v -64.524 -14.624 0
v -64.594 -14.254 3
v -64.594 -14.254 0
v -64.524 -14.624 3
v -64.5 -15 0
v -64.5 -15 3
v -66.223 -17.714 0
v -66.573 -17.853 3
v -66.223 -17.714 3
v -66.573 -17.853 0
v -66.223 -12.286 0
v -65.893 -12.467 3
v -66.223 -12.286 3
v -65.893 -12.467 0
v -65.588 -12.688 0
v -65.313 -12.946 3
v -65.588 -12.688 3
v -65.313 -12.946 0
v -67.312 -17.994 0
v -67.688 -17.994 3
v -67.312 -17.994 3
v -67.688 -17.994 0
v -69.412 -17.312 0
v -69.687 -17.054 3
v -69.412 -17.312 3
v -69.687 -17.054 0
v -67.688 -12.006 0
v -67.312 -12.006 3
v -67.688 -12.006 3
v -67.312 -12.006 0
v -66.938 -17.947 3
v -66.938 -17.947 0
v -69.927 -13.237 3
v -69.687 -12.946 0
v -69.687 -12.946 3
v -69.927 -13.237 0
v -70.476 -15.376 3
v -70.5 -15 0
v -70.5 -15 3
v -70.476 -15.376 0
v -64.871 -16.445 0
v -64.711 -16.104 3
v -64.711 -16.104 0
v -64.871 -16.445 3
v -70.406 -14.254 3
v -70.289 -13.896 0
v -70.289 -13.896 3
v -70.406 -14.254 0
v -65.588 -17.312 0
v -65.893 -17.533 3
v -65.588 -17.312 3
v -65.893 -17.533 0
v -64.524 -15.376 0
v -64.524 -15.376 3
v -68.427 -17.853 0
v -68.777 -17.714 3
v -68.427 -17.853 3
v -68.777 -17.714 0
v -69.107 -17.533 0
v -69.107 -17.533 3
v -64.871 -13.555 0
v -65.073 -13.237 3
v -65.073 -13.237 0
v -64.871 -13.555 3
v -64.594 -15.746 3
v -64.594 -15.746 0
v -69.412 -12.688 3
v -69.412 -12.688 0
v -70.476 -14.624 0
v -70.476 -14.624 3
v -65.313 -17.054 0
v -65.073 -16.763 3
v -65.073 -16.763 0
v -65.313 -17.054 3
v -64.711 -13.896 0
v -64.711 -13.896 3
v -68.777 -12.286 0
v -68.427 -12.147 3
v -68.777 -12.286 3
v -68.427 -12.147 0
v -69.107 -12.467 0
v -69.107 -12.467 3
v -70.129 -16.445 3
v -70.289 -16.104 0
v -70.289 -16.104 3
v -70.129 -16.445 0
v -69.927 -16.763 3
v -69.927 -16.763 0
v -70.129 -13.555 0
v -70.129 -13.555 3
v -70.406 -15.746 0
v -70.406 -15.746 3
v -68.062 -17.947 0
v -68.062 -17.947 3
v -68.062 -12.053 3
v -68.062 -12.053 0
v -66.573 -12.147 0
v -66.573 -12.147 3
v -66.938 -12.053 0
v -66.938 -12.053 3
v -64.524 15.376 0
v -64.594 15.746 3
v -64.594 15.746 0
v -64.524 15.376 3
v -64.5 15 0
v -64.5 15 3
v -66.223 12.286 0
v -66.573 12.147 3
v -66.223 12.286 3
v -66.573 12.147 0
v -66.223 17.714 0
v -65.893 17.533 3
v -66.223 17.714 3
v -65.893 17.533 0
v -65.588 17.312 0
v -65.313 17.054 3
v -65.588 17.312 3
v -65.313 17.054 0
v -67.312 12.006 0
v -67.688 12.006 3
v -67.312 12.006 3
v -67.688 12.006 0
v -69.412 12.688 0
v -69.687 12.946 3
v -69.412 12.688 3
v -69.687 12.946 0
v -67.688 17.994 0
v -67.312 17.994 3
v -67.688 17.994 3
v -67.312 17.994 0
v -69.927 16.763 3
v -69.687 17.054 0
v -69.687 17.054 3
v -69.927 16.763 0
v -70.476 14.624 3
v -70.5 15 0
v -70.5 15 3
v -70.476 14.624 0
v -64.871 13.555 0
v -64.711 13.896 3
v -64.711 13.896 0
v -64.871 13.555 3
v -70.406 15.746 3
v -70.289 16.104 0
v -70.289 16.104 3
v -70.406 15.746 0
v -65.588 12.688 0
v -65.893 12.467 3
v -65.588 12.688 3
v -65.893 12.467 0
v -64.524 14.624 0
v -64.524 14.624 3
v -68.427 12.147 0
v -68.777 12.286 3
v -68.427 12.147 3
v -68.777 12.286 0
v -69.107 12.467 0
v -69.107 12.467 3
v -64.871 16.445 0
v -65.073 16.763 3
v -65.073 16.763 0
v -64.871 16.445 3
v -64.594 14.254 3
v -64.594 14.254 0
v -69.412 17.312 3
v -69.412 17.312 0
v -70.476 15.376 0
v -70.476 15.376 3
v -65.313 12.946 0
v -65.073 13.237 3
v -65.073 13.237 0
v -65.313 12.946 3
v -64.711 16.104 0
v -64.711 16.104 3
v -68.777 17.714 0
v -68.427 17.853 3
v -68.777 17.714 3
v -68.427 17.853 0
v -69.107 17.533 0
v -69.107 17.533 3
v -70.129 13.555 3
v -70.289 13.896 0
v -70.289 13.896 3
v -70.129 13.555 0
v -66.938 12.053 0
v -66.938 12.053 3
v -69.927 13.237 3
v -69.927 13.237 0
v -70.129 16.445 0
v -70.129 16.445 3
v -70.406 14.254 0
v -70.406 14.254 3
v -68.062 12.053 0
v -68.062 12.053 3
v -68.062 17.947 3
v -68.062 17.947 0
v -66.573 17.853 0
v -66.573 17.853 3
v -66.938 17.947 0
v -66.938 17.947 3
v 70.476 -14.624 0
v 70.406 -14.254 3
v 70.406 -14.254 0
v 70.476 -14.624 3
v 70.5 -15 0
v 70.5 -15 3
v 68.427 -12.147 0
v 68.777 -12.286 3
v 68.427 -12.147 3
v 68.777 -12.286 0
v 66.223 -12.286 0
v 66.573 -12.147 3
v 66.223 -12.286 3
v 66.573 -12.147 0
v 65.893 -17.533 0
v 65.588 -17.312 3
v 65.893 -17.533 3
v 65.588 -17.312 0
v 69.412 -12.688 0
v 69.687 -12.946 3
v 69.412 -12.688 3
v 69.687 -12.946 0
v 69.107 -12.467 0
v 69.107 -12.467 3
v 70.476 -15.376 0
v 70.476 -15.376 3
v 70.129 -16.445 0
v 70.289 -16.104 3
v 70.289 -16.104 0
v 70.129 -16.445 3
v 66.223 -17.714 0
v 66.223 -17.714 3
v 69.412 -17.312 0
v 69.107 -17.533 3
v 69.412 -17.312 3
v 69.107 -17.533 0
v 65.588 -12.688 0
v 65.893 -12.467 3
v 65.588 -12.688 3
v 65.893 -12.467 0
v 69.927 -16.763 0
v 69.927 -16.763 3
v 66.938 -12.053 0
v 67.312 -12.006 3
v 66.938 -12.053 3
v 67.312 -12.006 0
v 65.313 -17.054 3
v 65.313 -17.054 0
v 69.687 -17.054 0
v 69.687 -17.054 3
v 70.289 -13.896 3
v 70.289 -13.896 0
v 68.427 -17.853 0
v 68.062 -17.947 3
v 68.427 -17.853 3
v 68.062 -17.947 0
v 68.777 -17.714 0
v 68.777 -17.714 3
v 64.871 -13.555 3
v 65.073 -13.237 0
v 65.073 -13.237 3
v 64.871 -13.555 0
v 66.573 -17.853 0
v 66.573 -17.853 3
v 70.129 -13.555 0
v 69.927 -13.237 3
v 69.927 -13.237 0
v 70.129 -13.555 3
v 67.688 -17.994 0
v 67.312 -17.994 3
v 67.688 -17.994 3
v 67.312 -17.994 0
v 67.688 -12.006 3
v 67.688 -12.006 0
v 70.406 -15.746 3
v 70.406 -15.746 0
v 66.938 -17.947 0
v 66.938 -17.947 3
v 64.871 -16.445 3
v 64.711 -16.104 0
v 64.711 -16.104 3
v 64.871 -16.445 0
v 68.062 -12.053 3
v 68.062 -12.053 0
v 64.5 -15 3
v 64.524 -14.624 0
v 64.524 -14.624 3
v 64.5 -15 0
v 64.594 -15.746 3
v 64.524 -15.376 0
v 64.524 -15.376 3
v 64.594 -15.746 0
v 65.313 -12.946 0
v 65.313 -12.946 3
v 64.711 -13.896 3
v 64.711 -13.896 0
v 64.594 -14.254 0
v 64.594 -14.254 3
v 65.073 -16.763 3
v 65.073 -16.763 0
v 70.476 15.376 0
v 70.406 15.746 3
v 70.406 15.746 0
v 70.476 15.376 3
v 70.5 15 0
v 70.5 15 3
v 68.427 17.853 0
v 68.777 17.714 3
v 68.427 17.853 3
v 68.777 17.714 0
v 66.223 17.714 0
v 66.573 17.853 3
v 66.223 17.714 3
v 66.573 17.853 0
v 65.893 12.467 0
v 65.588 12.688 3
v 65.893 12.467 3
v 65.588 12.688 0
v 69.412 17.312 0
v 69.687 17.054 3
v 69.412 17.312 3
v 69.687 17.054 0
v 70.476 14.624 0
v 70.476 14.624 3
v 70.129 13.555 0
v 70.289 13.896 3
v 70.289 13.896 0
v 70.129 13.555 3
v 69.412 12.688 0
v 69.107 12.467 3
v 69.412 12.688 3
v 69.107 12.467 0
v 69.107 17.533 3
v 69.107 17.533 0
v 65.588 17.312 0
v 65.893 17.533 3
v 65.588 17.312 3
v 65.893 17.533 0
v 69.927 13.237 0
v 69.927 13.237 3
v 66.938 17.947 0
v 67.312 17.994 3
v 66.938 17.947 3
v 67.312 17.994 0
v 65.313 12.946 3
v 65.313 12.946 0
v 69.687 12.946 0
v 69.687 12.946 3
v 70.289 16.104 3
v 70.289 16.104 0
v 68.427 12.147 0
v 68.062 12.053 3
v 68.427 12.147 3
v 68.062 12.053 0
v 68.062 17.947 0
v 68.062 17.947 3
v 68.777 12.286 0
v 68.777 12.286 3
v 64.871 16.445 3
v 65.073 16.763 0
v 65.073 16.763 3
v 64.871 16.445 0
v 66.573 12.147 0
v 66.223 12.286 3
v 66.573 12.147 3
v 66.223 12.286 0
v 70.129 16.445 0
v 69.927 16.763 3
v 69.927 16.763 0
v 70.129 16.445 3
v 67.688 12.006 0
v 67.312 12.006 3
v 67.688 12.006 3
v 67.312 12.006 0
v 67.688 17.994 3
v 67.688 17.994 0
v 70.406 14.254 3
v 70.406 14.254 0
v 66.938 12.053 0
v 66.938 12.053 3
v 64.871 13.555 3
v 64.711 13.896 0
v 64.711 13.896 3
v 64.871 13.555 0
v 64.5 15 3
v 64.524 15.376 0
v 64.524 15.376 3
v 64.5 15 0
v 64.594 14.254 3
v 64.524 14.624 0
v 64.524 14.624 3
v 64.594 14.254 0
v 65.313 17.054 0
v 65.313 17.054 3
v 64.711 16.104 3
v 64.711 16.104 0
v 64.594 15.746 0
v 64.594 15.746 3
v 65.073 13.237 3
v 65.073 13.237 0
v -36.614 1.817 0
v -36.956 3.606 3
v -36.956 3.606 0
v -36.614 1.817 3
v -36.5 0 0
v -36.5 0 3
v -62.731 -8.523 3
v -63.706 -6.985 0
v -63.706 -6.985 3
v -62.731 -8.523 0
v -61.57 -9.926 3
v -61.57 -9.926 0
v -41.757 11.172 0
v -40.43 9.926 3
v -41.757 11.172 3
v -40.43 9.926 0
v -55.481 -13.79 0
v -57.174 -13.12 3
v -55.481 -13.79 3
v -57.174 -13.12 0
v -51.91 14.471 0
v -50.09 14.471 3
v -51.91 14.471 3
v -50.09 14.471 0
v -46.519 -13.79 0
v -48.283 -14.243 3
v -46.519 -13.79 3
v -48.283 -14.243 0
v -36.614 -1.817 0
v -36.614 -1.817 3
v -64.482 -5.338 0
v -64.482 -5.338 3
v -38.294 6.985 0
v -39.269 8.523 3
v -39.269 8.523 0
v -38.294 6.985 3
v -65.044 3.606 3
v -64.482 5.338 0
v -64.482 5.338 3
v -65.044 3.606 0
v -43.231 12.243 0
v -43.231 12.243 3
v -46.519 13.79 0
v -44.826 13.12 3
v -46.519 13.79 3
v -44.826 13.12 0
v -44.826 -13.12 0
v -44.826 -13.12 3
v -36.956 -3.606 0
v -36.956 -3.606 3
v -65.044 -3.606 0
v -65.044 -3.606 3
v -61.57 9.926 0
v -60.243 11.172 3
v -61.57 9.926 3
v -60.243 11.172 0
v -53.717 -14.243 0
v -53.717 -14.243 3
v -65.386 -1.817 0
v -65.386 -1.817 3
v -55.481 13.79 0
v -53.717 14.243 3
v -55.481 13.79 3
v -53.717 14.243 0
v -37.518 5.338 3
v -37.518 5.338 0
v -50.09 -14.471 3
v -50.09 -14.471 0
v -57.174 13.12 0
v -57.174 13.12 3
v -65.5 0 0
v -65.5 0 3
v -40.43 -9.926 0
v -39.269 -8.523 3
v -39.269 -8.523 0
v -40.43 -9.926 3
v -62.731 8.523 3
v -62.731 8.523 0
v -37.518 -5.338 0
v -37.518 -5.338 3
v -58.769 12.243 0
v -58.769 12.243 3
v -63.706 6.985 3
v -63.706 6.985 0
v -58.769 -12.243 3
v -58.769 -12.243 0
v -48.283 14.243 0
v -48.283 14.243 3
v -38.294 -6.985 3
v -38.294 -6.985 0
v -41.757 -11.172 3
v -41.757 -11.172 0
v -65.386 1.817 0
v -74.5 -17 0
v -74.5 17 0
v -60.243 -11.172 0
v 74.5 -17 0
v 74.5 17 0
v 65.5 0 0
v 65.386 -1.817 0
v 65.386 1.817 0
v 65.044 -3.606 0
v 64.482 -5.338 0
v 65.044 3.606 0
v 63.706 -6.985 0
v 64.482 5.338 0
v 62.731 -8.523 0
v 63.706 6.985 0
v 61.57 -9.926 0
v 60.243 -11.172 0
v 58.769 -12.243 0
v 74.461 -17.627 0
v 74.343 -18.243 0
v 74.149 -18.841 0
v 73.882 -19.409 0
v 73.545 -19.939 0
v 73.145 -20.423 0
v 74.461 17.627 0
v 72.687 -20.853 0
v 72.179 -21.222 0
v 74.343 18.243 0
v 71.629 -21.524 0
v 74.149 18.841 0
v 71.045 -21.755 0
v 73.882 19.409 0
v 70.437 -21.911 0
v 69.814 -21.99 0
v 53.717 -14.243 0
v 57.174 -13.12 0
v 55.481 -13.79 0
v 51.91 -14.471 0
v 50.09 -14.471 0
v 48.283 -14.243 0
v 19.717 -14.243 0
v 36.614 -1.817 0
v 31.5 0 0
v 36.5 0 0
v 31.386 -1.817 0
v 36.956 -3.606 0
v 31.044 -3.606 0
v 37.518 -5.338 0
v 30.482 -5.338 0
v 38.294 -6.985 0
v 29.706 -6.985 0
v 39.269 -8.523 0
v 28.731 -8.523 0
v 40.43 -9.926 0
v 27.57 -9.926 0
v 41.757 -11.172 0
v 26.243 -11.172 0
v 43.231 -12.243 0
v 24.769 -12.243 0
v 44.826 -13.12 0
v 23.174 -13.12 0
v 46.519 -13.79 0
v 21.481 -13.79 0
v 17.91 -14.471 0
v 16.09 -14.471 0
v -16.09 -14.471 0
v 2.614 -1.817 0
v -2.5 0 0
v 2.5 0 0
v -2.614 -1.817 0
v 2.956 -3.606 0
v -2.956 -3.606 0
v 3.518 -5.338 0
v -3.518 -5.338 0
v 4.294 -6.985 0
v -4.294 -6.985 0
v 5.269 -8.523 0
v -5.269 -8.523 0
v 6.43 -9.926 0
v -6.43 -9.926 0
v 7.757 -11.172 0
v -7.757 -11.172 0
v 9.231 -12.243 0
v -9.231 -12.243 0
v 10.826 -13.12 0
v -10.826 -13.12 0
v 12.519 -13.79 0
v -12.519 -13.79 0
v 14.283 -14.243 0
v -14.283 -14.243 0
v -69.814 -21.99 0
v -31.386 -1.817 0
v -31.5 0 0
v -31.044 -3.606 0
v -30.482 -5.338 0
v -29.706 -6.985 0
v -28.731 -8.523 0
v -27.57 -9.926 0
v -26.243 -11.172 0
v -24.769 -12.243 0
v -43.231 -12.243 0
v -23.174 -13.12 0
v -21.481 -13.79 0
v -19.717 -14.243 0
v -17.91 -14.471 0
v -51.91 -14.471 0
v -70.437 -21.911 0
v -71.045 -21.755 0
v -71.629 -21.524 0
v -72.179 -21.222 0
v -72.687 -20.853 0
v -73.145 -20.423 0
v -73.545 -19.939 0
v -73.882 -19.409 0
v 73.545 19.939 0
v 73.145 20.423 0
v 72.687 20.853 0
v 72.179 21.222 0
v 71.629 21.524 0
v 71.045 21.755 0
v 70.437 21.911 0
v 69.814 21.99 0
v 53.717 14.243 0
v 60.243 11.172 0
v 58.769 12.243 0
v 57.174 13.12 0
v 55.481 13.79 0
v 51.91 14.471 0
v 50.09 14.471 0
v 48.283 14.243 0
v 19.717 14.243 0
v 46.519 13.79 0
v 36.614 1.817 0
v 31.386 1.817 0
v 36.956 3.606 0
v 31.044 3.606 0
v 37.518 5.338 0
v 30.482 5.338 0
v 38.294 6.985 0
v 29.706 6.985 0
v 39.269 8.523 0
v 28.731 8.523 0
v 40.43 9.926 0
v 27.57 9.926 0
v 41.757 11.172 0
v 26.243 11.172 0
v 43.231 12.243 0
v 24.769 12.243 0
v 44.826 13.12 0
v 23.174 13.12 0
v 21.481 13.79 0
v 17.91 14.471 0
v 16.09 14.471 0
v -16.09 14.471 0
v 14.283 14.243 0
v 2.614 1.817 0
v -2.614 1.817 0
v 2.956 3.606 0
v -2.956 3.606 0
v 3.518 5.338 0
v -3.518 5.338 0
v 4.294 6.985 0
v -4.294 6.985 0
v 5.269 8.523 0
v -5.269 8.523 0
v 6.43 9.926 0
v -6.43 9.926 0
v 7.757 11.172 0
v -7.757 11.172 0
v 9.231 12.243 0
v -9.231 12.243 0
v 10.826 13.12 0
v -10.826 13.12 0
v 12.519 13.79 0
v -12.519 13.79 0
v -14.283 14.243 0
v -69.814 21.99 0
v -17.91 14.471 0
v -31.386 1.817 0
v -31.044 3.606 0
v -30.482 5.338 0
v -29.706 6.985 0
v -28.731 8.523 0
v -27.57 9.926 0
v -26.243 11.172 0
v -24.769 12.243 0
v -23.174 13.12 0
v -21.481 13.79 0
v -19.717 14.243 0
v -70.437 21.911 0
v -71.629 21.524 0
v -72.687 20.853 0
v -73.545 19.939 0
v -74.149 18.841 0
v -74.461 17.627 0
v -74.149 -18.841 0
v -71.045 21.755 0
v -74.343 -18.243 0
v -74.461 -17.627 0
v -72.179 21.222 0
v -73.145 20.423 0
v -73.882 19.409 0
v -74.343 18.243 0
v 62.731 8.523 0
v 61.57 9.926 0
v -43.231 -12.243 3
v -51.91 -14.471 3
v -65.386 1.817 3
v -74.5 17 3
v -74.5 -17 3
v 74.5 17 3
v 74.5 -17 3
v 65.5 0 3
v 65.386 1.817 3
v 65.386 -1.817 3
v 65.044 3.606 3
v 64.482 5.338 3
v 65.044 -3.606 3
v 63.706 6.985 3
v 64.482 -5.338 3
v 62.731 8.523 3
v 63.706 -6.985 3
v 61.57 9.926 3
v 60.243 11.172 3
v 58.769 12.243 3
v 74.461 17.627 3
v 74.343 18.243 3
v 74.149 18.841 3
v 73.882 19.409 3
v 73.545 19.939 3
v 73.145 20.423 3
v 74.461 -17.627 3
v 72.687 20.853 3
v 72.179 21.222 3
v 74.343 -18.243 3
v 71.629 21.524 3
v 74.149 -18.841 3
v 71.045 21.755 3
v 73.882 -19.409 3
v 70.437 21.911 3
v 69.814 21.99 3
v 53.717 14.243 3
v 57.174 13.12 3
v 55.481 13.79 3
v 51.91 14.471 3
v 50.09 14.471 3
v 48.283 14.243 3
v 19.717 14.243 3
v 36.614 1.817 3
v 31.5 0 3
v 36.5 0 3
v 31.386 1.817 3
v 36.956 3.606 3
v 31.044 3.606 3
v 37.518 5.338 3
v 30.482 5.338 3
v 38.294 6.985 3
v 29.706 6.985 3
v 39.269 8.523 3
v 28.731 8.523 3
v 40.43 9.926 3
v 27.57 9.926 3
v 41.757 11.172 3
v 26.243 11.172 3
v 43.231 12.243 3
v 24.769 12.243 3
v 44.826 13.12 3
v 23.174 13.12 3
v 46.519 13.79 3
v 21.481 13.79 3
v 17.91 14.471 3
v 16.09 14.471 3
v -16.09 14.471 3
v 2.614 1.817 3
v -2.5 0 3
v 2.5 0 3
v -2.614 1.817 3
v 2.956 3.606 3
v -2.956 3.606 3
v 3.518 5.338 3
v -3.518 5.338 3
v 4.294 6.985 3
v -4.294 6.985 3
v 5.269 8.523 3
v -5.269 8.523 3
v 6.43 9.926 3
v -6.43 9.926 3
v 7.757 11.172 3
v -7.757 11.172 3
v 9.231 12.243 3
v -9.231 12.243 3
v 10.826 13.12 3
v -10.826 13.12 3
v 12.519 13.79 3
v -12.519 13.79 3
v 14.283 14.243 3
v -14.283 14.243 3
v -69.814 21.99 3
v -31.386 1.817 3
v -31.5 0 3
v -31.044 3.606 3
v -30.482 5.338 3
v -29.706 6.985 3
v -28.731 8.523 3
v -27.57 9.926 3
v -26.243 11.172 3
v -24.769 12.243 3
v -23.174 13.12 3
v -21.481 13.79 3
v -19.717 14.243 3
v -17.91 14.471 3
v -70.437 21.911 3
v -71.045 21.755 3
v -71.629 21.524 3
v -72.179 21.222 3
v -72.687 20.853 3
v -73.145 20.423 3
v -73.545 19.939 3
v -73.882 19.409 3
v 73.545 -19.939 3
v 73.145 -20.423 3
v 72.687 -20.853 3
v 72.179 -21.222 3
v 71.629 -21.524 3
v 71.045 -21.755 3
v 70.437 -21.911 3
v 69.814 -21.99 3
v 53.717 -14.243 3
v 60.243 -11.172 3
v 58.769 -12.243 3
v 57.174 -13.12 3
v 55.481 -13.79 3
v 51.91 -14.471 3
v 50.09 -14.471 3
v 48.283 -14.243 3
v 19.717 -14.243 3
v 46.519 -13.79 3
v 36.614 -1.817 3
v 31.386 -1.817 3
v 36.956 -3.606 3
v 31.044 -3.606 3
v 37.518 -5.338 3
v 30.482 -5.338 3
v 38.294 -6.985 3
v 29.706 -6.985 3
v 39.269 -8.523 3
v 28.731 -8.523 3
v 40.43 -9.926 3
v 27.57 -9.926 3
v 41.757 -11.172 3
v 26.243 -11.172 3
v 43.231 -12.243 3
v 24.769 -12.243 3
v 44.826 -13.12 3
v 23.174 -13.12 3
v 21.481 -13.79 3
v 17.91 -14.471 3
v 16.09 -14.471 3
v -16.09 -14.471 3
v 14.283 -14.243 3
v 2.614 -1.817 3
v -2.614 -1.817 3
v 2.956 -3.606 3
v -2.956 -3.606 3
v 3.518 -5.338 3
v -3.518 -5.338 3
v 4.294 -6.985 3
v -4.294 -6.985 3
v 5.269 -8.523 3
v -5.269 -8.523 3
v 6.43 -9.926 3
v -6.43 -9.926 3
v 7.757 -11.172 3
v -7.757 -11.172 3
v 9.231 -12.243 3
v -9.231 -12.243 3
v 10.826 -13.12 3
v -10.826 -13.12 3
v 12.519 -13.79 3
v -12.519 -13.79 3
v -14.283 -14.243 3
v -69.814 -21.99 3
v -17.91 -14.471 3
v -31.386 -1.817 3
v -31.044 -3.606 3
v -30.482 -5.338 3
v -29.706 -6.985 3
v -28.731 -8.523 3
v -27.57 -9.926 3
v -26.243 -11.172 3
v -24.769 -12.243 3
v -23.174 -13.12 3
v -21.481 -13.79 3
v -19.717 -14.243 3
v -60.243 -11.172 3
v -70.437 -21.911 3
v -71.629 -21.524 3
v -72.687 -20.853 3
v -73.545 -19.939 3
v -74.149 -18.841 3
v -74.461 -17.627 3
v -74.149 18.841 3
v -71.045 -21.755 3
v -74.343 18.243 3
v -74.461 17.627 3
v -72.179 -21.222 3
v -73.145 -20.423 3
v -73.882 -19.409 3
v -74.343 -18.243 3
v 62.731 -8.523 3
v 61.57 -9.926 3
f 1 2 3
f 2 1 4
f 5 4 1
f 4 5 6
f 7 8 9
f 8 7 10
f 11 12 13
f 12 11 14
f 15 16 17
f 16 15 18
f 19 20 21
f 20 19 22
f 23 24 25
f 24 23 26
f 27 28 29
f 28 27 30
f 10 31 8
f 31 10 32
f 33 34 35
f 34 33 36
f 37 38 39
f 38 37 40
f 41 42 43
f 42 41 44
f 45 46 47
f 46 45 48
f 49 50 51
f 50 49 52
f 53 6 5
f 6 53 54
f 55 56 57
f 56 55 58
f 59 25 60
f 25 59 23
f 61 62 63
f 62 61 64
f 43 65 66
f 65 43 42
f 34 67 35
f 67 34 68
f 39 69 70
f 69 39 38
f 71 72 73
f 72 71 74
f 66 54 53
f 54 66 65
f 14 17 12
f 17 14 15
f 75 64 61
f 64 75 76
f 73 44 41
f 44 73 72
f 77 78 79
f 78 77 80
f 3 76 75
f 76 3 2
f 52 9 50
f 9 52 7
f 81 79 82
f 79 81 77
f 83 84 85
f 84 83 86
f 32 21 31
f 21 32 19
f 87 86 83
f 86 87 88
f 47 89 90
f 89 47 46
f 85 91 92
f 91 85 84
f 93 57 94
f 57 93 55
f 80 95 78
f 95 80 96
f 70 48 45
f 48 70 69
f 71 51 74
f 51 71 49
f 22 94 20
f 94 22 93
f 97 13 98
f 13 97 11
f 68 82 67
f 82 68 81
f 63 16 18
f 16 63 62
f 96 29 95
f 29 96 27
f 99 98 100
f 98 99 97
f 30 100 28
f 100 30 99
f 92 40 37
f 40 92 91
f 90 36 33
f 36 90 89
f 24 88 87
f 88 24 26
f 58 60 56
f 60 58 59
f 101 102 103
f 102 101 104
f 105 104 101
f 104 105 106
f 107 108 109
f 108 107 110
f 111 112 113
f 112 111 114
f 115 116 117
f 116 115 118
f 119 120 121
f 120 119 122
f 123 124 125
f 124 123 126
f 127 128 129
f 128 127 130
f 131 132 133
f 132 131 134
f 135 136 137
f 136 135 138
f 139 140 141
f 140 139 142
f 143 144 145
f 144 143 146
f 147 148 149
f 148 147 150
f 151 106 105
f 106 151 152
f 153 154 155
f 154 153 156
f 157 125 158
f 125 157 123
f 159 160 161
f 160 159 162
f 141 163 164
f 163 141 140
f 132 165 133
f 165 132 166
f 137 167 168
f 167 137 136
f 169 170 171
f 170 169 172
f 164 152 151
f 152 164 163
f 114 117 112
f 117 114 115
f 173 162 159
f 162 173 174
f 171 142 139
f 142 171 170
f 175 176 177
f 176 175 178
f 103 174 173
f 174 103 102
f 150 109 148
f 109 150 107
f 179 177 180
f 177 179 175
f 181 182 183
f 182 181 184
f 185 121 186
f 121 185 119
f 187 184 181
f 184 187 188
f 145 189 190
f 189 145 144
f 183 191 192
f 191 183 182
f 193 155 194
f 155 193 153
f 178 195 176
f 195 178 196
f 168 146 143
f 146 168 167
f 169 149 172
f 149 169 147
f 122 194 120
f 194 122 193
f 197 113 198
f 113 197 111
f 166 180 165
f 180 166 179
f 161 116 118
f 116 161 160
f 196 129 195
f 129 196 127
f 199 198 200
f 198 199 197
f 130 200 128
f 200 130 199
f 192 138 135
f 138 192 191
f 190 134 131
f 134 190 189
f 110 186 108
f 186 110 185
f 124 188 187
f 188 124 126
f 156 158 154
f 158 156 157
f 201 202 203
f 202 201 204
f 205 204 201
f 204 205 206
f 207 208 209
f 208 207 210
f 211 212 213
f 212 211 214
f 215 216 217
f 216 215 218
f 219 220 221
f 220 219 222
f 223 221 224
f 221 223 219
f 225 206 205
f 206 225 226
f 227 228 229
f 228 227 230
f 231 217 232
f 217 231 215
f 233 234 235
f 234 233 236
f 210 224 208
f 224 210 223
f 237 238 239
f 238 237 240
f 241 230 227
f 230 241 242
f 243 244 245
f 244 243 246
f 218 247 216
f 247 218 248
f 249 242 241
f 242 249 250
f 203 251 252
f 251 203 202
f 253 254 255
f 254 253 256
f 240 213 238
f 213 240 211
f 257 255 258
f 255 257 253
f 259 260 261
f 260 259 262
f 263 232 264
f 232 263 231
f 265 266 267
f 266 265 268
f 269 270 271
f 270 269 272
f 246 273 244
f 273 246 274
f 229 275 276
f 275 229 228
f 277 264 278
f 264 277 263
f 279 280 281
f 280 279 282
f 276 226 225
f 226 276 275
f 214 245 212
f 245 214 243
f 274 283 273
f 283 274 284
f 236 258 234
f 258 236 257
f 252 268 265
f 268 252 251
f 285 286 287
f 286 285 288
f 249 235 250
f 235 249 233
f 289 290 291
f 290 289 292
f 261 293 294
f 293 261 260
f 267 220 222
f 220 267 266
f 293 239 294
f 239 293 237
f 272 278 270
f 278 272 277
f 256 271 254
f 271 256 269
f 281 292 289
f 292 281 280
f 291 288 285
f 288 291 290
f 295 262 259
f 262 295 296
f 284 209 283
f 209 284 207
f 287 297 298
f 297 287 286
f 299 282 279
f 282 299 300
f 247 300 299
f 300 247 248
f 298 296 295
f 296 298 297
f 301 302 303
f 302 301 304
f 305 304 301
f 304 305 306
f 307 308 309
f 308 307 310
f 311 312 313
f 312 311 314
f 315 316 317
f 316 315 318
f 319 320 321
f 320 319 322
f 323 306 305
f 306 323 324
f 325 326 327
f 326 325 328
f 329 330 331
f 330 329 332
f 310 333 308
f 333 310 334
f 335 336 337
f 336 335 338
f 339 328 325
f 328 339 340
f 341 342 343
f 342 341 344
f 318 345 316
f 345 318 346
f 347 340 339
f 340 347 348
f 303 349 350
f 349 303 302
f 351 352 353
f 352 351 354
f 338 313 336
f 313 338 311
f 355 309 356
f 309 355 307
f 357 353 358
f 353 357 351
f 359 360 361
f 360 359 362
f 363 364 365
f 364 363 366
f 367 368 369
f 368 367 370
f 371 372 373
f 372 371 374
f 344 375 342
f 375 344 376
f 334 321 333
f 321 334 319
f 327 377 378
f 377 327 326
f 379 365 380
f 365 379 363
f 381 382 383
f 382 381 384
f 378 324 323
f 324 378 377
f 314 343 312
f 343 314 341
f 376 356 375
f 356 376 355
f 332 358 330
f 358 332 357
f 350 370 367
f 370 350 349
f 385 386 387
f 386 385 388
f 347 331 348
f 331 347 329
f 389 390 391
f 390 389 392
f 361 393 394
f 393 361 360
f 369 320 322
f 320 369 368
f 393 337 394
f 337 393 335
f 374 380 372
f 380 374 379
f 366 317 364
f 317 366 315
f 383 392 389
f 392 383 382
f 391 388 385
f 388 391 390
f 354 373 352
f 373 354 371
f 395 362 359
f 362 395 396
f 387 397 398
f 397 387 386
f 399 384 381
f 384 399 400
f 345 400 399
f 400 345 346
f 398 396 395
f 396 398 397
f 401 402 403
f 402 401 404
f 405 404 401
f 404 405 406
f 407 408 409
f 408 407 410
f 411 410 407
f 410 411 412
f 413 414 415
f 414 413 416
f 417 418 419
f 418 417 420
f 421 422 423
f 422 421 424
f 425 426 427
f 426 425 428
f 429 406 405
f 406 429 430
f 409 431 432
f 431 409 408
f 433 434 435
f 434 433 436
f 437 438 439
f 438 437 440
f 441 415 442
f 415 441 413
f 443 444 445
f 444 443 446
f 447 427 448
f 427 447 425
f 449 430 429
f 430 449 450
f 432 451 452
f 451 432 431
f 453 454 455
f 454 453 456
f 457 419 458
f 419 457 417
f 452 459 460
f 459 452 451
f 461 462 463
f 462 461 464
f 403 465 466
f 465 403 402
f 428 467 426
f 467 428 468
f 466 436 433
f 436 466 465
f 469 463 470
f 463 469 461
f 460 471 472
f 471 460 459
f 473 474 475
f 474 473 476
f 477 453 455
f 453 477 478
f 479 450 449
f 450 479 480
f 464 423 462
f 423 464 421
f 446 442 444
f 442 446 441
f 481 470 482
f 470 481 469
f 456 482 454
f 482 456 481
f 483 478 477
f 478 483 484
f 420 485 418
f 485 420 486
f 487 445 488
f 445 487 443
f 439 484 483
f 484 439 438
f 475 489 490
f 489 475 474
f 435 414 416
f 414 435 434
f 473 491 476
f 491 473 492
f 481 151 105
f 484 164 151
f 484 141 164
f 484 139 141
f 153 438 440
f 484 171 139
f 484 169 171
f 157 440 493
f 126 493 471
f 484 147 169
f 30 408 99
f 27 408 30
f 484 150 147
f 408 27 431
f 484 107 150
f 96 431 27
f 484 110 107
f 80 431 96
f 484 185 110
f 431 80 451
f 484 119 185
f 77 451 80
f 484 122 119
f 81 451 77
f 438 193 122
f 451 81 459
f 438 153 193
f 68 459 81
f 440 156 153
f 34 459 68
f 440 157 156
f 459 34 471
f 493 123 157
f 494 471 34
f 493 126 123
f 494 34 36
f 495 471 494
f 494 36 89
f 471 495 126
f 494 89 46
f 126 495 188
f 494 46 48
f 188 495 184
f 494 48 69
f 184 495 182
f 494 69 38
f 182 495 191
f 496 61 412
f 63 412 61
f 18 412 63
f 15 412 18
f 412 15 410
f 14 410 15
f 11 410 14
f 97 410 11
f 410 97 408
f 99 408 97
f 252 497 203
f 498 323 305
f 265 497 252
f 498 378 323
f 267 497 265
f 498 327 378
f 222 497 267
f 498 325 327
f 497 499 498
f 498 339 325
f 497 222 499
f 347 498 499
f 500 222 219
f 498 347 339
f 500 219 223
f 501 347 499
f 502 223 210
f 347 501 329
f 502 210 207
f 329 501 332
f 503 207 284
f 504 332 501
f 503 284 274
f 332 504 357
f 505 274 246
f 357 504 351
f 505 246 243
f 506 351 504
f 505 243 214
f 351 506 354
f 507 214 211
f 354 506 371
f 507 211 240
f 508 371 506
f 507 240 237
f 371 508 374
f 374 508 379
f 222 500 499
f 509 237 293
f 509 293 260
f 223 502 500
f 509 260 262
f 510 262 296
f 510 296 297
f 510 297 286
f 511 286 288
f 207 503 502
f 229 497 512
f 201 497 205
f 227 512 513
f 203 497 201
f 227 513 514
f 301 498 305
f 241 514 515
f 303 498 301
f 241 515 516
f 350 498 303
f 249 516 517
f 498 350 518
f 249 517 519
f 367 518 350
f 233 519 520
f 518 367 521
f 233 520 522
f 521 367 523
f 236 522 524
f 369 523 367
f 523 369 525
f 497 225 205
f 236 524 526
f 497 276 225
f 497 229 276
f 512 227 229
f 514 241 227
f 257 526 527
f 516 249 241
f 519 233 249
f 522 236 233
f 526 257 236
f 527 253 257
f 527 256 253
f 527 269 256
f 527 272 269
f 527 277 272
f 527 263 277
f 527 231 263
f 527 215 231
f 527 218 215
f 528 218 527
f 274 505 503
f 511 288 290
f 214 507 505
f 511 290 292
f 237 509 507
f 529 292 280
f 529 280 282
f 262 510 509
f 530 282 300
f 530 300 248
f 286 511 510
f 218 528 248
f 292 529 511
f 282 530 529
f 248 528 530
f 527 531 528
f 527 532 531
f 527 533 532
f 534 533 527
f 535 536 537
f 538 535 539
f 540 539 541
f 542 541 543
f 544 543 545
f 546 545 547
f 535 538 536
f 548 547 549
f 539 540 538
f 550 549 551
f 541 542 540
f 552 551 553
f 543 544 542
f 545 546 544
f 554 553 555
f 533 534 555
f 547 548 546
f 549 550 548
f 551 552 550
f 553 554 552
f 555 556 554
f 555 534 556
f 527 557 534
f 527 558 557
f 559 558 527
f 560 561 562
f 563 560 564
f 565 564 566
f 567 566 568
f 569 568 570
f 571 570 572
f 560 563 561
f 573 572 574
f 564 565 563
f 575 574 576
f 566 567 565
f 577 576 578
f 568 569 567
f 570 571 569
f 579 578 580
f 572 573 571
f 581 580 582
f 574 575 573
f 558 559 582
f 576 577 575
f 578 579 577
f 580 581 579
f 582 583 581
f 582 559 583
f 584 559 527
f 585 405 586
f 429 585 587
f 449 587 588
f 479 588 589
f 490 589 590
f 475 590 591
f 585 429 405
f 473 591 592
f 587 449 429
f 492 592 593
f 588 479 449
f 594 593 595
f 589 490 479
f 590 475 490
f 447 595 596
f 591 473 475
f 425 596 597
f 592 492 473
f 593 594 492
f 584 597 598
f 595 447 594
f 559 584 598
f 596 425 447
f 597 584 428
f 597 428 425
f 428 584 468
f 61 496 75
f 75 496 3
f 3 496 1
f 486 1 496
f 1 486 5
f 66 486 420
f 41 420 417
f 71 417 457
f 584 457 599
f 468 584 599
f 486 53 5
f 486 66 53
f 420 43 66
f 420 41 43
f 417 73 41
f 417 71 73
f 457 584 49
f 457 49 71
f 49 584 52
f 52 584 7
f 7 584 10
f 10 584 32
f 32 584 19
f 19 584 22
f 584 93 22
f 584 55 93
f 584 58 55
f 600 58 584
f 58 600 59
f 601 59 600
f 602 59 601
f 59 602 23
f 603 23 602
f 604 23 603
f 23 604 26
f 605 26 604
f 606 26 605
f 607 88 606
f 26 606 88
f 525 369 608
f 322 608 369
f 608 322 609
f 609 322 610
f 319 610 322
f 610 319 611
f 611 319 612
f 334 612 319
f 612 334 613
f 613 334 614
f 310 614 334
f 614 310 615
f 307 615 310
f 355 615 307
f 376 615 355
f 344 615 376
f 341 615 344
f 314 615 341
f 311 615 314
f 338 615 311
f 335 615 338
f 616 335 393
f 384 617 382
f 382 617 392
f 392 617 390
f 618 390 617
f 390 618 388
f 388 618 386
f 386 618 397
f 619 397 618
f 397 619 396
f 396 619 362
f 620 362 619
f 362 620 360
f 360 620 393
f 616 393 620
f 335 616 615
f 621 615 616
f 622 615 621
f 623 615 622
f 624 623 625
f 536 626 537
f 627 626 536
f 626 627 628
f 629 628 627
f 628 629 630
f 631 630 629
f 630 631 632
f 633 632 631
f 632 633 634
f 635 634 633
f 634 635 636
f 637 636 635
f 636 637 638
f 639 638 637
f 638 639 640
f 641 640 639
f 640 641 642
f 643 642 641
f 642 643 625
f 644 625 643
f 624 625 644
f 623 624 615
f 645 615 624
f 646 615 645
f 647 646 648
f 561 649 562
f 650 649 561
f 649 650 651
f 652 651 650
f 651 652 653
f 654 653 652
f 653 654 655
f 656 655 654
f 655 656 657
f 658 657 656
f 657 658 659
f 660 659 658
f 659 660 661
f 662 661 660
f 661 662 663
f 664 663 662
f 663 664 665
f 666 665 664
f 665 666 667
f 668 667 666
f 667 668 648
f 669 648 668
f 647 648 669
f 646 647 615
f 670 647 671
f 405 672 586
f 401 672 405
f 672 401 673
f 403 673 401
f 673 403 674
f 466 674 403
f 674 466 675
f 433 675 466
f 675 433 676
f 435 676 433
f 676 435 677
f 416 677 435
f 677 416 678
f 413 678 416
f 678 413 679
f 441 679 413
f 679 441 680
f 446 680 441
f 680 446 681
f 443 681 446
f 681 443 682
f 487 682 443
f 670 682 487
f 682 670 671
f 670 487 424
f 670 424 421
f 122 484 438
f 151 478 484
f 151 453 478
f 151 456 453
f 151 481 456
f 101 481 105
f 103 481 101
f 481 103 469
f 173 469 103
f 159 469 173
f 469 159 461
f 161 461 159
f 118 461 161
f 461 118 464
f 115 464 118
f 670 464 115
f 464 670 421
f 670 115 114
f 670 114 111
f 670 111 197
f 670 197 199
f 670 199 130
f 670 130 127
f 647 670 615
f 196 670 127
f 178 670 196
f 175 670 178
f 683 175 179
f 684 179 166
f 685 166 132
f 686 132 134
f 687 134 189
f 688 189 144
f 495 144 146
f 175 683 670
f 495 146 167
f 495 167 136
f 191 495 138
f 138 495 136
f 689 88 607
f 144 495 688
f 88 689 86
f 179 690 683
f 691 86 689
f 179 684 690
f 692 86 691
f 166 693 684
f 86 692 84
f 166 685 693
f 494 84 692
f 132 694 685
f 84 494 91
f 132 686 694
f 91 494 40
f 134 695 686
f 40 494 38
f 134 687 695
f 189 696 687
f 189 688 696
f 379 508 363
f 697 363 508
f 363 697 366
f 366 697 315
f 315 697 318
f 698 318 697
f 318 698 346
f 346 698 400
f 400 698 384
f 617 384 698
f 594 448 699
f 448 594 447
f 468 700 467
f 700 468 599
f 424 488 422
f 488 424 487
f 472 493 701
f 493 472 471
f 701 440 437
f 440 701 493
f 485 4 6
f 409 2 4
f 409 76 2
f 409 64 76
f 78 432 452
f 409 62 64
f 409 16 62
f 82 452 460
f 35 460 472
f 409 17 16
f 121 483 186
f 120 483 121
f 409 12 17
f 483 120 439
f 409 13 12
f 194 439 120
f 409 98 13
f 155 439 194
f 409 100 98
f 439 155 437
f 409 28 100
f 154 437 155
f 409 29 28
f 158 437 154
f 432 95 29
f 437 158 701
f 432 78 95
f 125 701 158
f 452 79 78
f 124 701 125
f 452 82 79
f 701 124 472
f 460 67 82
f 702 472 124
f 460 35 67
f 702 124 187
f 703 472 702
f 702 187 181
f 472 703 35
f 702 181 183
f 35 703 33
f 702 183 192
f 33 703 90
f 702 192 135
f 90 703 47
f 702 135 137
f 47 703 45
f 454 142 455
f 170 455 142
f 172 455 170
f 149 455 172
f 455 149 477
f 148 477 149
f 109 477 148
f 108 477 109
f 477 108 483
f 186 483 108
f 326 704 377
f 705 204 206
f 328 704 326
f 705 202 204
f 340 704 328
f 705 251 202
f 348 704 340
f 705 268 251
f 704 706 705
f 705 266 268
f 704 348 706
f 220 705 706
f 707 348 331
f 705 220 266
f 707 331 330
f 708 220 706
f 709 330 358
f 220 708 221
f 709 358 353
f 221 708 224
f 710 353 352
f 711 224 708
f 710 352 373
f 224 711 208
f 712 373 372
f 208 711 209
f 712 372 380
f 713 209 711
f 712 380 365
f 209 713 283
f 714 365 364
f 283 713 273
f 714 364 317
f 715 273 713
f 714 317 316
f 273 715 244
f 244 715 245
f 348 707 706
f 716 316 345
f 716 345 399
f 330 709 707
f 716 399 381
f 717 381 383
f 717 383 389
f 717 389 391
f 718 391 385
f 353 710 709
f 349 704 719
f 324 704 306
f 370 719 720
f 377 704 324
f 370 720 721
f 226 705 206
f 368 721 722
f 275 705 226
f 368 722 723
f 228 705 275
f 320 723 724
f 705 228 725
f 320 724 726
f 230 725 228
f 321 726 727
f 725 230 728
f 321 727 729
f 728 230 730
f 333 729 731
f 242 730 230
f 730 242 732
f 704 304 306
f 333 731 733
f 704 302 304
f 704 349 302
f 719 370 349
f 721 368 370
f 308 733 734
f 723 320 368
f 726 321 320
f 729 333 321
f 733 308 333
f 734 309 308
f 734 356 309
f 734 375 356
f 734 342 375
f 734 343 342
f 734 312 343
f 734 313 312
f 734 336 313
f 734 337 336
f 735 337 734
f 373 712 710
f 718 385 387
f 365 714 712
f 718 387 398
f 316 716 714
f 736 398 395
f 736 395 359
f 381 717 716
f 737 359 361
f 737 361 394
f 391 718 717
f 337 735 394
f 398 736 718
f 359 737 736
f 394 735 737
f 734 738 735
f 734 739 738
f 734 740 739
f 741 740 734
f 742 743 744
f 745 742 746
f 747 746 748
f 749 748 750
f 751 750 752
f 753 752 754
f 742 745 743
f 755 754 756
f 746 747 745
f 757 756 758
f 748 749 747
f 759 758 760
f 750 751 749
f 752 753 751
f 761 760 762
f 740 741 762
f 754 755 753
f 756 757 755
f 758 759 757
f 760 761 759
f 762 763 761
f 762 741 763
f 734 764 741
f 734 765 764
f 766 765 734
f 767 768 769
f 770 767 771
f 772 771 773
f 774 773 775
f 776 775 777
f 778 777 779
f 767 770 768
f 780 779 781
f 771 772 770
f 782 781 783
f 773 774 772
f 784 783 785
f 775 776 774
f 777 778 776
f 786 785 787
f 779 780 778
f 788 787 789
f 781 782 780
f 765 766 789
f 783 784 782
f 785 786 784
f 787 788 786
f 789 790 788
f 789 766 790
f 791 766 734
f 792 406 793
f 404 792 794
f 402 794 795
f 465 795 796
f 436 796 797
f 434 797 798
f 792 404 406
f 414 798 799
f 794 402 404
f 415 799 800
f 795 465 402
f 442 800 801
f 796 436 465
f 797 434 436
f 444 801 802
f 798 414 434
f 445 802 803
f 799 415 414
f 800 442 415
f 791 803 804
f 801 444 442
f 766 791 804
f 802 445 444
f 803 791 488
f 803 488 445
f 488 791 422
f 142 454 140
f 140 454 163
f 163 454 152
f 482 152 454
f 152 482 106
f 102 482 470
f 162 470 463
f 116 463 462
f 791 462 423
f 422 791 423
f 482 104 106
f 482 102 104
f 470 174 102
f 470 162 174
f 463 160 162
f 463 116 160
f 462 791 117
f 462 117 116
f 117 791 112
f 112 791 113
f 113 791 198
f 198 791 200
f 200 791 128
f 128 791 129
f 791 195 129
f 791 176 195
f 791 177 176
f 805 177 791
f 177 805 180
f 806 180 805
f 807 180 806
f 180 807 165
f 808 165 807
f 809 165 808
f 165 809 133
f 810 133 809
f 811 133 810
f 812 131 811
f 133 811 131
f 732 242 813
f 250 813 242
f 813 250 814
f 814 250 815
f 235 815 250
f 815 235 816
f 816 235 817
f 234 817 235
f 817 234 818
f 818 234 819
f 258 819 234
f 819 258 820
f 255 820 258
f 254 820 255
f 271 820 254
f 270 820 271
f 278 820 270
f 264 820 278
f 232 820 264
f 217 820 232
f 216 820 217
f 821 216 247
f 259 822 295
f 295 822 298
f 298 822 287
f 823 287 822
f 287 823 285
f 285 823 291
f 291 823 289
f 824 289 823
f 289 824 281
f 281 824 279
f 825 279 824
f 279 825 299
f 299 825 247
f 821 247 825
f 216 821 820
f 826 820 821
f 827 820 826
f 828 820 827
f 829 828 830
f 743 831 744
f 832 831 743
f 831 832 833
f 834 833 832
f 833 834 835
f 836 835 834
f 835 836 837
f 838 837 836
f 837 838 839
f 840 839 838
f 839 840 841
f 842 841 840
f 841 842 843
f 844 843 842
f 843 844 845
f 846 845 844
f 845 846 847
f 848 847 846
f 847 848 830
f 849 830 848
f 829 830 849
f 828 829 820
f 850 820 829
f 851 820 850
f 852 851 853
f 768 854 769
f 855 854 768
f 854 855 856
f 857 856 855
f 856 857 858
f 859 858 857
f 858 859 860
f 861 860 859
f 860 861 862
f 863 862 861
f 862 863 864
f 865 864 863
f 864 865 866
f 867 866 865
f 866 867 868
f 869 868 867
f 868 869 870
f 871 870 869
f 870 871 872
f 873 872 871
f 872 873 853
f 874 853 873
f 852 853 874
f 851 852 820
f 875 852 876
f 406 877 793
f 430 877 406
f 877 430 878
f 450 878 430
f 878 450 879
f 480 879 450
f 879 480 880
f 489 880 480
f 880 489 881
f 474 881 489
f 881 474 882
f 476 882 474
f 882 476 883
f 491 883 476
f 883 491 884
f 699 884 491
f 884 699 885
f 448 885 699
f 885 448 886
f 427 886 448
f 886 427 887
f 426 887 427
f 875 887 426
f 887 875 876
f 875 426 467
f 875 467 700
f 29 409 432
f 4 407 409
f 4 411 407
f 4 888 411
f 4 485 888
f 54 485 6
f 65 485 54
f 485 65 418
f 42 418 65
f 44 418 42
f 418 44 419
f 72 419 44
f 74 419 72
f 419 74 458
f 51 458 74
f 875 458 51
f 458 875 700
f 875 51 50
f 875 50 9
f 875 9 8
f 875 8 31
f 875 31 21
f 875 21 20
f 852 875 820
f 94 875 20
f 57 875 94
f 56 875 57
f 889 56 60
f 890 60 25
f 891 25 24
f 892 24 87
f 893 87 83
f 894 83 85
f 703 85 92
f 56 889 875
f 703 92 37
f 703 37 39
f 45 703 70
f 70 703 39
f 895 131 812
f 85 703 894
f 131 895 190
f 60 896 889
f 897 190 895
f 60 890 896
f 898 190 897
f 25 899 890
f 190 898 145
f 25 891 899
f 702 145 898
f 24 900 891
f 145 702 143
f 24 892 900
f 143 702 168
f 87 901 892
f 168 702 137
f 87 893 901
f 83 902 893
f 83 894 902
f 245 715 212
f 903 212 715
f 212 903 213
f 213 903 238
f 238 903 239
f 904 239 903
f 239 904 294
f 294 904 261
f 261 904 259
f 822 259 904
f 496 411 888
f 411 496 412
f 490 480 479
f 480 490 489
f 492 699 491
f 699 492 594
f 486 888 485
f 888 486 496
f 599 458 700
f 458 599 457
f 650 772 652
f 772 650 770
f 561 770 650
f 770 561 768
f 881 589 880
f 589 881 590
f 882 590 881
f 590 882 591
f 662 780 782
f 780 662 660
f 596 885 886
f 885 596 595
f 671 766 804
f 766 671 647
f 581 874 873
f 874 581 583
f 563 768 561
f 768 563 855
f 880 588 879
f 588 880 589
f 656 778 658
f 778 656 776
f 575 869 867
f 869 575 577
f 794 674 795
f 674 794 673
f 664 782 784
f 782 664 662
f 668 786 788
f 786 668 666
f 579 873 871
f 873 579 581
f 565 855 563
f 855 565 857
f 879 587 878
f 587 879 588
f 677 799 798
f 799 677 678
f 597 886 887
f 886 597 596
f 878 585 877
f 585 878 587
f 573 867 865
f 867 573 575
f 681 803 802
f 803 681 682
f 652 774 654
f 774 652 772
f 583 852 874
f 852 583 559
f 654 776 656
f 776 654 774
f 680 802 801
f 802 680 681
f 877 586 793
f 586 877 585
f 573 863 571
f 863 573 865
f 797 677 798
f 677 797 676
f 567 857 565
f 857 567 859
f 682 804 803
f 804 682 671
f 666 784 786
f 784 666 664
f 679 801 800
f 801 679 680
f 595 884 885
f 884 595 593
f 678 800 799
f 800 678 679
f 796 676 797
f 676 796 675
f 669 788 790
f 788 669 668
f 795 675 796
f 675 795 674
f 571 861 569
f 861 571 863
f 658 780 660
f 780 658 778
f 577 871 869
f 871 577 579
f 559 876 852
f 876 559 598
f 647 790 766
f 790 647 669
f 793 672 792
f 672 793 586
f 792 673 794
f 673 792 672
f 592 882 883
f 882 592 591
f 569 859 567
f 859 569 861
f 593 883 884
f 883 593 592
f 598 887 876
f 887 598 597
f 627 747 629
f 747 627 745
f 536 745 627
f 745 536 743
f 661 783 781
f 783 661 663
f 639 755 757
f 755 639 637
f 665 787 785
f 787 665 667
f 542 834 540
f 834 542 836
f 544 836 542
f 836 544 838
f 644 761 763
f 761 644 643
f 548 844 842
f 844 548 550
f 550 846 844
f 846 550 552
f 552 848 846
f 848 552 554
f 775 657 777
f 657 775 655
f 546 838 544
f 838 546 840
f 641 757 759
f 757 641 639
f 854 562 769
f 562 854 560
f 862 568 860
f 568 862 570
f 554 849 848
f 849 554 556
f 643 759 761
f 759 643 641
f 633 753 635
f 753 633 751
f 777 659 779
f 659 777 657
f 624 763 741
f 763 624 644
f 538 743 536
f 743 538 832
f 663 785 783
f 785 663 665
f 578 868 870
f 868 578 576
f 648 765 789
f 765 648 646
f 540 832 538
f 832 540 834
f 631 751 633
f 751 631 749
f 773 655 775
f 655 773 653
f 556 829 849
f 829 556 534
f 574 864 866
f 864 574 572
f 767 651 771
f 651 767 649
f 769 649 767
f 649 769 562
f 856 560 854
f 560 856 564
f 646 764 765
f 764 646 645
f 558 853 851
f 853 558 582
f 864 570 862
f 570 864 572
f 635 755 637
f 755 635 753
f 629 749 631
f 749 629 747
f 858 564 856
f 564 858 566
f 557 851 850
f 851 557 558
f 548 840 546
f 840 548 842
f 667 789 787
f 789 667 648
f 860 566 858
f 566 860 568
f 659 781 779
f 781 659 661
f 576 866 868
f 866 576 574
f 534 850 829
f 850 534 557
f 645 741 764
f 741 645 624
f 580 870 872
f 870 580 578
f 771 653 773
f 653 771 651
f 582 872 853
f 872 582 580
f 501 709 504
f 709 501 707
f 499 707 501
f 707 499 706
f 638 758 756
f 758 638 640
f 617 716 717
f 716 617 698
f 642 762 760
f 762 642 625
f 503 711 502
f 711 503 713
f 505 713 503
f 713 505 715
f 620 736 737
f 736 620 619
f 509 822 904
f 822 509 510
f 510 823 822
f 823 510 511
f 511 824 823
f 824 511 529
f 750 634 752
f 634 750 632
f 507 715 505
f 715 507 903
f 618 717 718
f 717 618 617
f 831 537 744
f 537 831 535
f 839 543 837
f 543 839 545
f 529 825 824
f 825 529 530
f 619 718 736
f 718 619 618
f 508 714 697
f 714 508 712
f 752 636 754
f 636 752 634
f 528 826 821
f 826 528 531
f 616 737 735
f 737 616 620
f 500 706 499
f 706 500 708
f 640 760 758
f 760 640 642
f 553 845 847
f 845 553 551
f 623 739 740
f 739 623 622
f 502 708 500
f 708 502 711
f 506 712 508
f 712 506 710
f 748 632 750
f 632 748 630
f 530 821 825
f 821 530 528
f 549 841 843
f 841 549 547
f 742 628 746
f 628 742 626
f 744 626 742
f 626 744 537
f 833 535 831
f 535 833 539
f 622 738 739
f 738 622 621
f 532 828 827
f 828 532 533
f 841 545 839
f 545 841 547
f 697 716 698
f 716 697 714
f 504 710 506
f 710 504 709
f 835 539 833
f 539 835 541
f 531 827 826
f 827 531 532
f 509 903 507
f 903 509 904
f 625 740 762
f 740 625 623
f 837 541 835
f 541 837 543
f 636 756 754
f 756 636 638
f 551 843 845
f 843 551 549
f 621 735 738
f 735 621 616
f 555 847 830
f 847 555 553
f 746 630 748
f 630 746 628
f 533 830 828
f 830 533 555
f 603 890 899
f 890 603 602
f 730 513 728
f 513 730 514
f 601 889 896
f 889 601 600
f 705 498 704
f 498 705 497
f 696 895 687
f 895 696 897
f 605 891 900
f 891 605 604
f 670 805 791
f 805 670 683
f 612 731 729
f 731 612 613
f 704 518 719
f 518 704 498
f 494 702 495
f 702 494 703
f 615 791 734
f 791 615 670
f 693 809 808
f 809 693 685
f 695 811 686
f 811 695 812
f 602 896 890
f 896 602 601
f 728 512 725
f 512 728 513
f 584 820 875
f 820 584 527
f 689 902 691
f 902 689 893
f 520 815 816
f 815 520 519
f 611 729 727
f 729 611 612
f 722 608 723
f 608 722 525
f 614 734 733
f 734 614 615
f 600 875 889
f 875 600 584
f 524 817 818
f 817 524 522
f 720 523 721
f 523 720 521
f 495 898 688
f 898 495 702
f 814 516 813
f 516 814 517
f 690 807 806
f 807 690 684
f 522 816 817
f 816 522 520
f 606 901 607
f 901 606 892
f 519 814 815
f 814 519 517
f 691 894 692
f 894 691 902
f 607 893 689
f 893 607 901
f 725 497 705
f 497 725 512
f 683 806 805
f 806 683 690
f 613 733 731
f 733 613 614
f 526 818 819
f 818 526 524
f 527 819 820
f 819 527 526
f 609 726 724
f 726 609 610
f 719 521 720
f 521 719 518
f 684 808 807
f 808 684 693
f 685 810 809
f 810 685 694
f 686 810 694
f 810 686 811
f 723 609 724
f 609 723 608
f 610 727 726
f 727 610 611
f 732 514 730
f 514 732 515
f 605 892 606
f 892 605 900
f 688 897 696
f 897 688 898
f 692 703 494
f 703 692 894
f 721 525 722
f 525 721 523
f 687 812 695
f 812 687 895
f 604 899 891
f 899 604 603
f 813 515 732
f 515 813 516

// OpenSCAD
$fn = 50;


difference() {
	union() {
		hull() {
			translate(v = [-69.5000000000, 17.0000000000, 0]) {
				cylinder(h = 3, r = 5);
			}
			translate(v = [69.5000000000, 17.0000000000, 0]) {
				cylinder(h = 3, r = 5);
			}
			translate(v = [-69.5000000000, -17.0000000000, 0]) {
				cylinder(h = 3, r = 5);
			}
			translate(v = [69.5000000000, -17.0000000000, 0]) {
				cylinder(h = 3, r = 5);
			}
		}
	}
	union() {
		#translate(v = [-67.5000000000, -15.0000000000, -100.0000000000]) {
			cylinder(h = 200, r = 3.0000000000);
		}
		#translate(v = [-67.5000000000, 15.0000000000, -100.0000000000]) {
			cylinder(h = 200, r = 3.0000000000);
		}
		#translate(v = [67.5000000000, -15.0000000000, -100.0000000000]) {
			cylinder(h = 200, r = 3.0000000000);
		}
		#translate(v = [67.5000000000, 15.0000000000, -100.0000000000]) {
			cylinder(h = 200, r = 3.0000000000);
		}
		#translate(v = [-51.0000000000, 0, 0]) {
			cylinder(h = 3, r = 14.5000000000);
		}
		#translate(v = [-17.0000000000, 0, 0]) {
			cylinder(h = 3, r = 14.5000000000);
		}
		#translate(v = [17.0000000000, 0, 0]) {
			cylinder(h = 3, r = 14.5000000000);
		}
		#translate(v = [51.0000000000, 0, 0]) {
			cylinder(h = 3, r = 14.5000000000);
		}
	}
}
